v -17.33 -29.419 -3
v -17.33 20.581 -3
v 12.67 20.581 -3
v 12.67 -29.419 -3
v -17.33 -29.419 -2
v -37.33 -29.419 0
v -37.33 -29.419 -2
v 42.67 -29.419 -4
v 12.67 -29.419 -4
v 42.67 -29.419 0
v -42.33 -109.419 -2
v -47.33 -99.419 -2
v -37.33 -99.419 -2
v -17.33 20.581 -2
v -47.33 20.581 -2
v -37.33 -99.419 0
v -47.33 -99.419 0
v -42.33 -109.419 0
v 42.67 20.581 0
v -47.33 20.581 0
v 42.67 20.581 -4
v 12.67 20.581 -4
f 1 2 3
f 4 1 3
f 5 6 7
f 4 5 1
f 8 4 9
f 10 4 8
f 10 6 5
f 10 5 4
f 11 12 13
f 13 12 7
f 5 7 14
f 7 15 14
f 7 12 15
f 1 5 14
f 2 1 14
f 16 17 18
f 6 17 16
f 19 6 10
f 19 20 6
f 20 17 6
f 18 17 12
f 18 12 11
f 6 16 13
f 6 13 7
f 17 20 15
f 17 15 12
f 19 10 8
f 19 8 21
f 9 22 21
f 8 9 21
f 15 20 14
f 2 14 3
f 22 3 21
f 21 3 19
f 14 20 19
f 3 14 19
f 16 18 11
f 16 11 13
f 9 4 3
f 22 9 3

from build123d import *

# Parameters (mm, degrees)
F1_DEPTH = 2
F0_W     = 30
F0_H     = 50
F2_DEPTH = 3
F3_DEPTH = 4


with BuildPart() as f1:
    # F0 (on Top) → F1 (new body)
    with BuildSketch(Plane.XY):
        Polygon((-17.329822, 20.581069), (-47.329822, 20.581069), (-47.329822, -29.418931), (-47.329822, -99.418931), (-42.329822, -109.418931), (-37.329822, -99.418931), (-37.329822, -29.418931), (-17.329822, -29.418931), align=None)
    extrude(amount=-F1_DEPTH)

    # F0 (on Top) → F2 (join)
    with BuildSketch(Plane.XY):
        with Locations((-2.329822, -4.418931)):
            Rectangle(F0_W, F0_H)
    extrude(amount=-F2_DEPTH)

    # F0 (on Top) → F3 (join)
    with BuildSketch(Plane.XY):
        with Locations((27.670178, -4.418931)):
            Rectangle(F0_W, F0_H)
    extrude(amount=-F3_DEPTH)


solid = f1.part
